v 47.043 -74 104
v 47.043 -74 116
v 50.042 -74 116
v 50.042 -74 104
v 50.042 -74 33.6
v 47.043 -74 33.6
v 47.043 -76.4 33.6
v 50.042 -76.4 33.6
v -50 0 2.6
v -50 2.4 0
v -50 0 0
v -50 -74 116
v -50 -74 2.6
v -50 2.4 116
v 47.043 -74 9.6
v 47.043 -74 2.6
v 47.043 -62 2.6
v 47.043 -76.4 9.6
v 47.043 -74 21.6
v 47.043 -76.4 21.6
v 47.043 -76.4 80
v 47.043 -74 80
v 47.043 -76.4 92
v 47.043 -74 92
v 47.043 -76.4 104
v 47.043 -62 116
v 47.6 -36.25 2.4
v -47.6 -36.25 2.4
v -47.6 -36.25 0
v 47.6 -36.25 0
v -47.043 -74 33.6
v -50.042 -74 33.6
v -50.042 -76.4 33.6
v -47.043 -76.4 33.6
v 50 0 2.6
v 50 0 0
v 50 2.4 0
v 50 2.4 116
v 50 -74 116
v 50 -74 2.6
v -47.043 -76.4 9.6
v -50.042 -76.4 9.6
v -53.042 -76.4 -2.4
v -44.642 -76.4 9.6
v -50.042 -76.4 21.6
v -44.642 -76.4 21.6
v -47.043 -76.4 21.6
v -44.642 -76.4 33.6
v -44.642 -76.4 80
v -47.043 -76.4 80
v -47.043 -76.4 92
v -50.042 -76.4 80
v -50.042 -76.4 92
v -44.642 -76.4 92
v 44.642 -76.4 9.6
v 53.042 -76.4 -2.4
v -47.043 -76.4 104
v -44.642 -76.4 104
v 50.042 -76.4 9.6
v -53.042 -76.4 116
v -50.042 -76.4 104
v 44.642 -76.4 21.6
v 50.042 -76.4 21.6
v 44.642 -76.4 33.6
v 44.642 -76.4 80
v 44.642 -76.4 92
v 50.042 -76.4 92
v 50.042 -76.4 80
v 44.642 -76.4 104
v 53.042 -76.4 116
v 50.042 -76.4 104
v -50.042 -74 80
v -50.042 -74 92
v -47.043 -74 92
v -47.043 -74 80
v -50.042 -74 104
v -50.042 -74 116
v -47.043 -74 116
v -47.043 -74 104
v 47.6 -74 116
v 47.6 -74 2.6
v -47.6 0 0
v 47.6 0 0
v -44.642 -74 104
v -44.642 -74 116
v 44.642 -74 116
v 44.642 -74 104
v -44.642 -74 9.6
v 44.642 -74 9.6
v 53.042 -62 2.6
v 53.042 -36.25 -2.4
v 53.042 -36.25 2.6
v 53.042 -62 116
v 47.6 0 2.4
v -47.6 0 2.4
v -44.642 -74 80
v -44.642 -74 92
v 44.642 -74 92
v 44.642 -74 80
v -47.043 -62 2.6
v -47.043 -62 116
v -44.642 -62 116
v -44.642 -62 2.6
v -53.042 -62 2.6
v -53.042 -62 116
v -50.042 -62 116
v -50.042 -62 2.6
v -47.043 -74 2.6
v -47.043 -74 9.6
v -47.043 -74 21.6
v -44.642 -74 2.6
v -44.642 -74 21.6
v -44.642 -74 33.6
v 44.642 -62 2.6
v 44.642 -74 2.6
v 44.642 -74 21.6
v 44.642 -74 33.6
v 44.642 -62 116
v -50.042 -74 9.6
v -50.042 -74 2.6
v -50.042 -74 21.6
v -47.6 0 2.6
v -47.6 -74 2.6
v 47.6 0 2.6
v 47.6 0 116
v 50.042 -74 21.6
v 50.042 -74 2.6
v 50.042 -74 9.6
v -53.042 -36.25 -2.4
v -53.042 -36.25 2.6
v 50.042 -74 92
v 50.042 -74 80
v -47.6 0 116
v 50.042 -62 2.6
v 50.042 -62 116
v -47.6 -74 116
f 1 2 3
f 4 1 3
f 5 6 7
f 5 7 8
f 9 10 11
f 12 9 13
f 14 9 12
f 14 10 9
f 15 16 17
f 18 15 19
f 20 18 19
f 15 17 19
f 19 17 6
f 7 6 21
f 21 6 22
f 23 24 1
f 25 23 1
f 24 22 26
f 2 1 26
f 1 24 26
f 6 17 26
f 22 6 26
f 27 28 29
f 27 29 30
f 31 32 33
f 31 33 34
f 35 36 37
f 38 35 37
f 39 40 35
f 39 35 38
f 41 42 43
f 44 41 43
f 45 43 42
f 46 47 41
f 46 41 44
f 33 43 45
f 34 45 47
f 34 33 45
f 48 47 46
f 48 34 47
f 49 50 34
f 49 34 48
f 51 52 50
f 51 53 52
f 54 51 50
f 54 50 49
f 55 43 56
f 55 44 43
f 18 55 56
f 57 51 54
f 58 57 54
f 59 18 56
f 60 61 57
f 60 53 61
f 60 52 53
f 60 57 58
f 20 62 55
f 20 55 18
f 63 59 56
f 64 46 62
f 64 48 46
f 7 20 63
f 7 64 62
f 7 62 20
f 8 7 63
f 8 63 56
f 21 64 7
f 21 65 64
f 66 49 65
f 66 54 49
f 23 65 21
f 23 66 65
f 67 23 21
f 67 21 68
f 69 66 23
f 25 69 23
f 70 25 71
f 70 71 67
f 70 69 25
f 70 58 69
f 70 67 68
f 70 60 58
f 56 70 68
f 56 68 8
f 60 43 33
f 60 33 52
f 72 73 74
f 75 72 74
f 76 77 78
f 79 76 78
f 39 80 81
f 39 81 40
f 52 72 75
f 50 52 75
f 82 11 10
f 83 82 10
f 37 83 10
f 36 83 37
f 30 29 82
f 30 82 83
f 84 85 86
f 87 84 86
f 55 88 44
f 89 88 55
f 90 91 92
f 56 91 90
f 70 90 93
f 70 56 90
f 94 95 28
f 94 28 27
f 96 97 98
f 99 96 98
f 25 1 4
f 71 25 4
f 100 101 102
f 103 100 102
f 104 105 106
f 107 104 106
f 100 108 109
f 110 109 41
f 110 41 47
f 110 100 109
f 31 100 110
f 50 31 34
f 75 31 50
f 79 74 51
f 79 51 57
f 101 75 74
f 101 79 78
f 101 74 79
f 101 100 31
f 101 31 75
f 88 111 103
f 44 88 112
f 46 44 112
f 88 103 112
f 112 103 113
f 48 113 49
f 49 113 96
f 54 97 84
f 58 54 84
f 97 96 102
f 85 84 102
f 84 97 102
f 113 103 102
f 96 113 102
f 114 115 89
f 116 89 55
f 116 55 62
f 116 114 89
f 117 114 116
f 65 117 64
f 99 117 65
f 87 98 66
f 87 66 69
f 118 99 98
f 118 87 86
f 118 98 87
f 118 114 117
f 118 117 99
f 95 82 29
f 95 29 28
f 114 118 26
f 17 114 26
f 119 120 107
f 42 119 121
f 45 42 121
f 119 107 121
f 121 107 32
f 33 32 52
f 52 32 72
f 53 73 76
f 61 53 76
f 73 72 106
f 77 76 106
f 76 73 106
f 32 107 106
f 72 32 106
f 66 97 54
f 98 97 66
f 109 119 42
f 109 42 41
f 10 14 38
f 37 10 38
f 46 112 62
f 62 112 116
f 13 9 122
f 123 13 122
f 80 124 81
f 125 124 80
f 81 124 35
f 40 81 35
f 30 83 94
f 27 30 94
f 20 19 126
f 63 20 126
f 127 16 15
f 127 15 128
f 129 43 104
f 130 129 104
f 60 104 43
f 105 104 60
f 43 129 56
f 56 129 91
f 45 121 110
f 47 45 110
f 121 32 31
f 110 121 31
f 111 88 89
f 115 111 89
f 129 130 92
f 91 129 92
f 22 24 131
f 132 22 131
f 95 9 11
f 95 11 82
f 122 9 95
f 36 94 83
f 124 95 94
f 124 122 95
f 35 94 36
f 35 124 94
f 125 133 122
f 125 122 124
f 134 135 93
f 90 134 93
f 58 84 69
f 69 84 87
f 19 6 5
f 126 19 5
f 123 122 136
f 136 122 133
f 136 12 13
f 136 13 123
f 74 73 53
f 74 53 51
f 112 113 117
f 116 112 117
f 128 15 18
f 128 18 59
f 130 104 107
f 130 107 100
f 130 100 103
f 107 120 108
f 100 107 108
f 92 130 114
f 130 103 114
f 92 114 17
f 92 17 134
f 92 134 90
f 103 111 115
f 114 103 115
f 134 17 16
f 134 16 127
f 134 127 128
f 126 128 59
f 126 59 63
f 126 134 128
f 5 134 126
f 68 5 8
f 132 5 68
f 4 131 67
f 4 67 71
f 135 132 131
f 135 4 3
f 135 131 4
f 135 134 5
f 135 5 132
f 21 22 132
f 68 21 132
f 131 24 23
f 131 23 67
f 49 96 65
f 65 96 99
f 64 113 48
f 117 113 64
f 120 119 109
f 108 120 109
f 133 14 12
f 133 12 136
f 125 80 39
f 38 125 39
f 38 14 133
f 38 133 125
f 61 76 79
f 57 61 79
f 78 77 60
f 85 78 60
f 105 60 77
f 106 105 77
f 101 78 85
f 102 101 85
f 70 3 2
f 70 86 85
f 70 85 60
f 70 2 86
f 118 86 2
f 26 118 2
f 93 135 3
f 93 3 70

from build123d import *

# Parameters (mm, degrees)
F0_W          = 100
F0_H          = 116
F1_DEPTH      = 2.4
F2_W          = 2.4
F2_H          = 113.4
F3_DEPTH      = 74
F4_W          = 95.2
F4_H          = 2.4
F5_DEPTH      = 36.25
F6_W          = 106.085
F6_H          = 12
F7_DEPTH      = 2.4
F8_W          = 3
F8_H          = 118.4
F9_DEPTH      = 12
F9_DEPTH_BACK = 2.4
F8_W_2        = 2.4
F8_H_2        = 113.4
F10_W         = 106.085
F10_H         = 5
F11_DEPTH     = 37.75


with BuildPart() as f1:
    # F0 (on Front) → F1 (new body)
    with BuildSketch(Plane.XZ):
        with Locations((0, 58)):
            Rectangle(F0_W, F0_H)
    extrude(amount=-F1_DEPTH)

    # F2 (on face) → F3 (join)
    with BuildSketch(Plane.XZ):
        with Locations((-48.8, 59.3)):
            Rectangle(F2_W, F2_H)
        with Locations((48.8, 59.3)):
            Rectangle(F2_W, F2_H)
    extrude(amount=F3_DEPTH)

    # F4 (on face) → F5 (join)
    with BuildSketch(Plane.XZ):
        with Locations((0, 1.2)):
            Rectangle(F4_W, F4_H)
    extrude(amount=F5_DEPTH)


with BuildPart() as f7:
    # F6 (on face) → F7 (new body)
    with BuildSketch(Plane.XZ.offset(74)):
        with Locations((0, 110)):
            Rectangle(F6_W, F6_H)
        with Locations((0, 86)):
            Rectangle(F6_W, F6_H)
        with Locations((0, 3.6)):
            Rectangle(F6_W, F6_H)
        with Locations((0, 27.6)):
            Rectangle(F6_W, F6_H)
    extrude(amount=F7_DEPTH)



with BuildPart() as f9:
    # F8 (on face) → F9 (new body, two sides)
    with BuildSketch(Plane.XZ.offset(74)) as f9_sk:
        with Locations((51.5425, 56.8)):
            Rectangle(F8_W, F8_H)
    extrude(amount=-F9_DEPTH)
    extrude(f9_sk.sketch, amount=F9_DEPTH_BACK)


with BuildPart() as f9b:
    # F8 (on face) → F9, piece 2 (new body, two sides)
    with BuildSketch(Plane.XZ.offset(74)) as f9_2_sk:
        with Locations((-51.5425, 56.8)):
            Rectangle(F8_W, F8_H)
    extrude(amount=-F9_DEPTH)
    extrude(f9_2_sk.sketch, amount=F9_DEPTH_BACK)


with BuildPart() as f9c:
    # F8 (on face) → F9, piece 3 (new body, two sides)
    with BuildSketch(Plane.XZ.offset(74)) as f9_3_sk:
        with Locations((45.8425, 59.3)):
            Rectangle(F8_W_2, F8_H_2)
    extrude(amount=-F9_DEPTH)
    extrude(f9_3_sk.sketch, amount=F9_DEPTH_BACK)


with BuildPart() as f9d:
    # F8 (on face) → F9, piece 4 (new body, two sides)
    with BuildSketch(Plane.XZ.offset(74)) as f9_4_sk:
        with Locations((-45.8425, 59.3)):
            Rectangle(F8_W_2, F8_H_2)
    extrude(amount=-F9_DEPTH)
    extrude(f9_4_sk.sketch, amount=F9_DEPTH_BACK)


with BuildPart() as f7_1:
    add(f7.part)

    add(f9.part)  # F11 merges F9

    add(f9b.part)  # F11 merges F9b

    add(f9c.part)  # F11 merges F9c

    add(f9d.part)  # F11 merges F9d
    # F10 (on face) → F11 (join, through all)
    with BuildSketch(Plane.XZ.offset(74)):
        with Locations((0, 0.1)):
            Rectangle(F10_W, F10_H)
    extrude(amount=-F11_DEPTH)


solid = Compound([f1.part, f7_1.part])
